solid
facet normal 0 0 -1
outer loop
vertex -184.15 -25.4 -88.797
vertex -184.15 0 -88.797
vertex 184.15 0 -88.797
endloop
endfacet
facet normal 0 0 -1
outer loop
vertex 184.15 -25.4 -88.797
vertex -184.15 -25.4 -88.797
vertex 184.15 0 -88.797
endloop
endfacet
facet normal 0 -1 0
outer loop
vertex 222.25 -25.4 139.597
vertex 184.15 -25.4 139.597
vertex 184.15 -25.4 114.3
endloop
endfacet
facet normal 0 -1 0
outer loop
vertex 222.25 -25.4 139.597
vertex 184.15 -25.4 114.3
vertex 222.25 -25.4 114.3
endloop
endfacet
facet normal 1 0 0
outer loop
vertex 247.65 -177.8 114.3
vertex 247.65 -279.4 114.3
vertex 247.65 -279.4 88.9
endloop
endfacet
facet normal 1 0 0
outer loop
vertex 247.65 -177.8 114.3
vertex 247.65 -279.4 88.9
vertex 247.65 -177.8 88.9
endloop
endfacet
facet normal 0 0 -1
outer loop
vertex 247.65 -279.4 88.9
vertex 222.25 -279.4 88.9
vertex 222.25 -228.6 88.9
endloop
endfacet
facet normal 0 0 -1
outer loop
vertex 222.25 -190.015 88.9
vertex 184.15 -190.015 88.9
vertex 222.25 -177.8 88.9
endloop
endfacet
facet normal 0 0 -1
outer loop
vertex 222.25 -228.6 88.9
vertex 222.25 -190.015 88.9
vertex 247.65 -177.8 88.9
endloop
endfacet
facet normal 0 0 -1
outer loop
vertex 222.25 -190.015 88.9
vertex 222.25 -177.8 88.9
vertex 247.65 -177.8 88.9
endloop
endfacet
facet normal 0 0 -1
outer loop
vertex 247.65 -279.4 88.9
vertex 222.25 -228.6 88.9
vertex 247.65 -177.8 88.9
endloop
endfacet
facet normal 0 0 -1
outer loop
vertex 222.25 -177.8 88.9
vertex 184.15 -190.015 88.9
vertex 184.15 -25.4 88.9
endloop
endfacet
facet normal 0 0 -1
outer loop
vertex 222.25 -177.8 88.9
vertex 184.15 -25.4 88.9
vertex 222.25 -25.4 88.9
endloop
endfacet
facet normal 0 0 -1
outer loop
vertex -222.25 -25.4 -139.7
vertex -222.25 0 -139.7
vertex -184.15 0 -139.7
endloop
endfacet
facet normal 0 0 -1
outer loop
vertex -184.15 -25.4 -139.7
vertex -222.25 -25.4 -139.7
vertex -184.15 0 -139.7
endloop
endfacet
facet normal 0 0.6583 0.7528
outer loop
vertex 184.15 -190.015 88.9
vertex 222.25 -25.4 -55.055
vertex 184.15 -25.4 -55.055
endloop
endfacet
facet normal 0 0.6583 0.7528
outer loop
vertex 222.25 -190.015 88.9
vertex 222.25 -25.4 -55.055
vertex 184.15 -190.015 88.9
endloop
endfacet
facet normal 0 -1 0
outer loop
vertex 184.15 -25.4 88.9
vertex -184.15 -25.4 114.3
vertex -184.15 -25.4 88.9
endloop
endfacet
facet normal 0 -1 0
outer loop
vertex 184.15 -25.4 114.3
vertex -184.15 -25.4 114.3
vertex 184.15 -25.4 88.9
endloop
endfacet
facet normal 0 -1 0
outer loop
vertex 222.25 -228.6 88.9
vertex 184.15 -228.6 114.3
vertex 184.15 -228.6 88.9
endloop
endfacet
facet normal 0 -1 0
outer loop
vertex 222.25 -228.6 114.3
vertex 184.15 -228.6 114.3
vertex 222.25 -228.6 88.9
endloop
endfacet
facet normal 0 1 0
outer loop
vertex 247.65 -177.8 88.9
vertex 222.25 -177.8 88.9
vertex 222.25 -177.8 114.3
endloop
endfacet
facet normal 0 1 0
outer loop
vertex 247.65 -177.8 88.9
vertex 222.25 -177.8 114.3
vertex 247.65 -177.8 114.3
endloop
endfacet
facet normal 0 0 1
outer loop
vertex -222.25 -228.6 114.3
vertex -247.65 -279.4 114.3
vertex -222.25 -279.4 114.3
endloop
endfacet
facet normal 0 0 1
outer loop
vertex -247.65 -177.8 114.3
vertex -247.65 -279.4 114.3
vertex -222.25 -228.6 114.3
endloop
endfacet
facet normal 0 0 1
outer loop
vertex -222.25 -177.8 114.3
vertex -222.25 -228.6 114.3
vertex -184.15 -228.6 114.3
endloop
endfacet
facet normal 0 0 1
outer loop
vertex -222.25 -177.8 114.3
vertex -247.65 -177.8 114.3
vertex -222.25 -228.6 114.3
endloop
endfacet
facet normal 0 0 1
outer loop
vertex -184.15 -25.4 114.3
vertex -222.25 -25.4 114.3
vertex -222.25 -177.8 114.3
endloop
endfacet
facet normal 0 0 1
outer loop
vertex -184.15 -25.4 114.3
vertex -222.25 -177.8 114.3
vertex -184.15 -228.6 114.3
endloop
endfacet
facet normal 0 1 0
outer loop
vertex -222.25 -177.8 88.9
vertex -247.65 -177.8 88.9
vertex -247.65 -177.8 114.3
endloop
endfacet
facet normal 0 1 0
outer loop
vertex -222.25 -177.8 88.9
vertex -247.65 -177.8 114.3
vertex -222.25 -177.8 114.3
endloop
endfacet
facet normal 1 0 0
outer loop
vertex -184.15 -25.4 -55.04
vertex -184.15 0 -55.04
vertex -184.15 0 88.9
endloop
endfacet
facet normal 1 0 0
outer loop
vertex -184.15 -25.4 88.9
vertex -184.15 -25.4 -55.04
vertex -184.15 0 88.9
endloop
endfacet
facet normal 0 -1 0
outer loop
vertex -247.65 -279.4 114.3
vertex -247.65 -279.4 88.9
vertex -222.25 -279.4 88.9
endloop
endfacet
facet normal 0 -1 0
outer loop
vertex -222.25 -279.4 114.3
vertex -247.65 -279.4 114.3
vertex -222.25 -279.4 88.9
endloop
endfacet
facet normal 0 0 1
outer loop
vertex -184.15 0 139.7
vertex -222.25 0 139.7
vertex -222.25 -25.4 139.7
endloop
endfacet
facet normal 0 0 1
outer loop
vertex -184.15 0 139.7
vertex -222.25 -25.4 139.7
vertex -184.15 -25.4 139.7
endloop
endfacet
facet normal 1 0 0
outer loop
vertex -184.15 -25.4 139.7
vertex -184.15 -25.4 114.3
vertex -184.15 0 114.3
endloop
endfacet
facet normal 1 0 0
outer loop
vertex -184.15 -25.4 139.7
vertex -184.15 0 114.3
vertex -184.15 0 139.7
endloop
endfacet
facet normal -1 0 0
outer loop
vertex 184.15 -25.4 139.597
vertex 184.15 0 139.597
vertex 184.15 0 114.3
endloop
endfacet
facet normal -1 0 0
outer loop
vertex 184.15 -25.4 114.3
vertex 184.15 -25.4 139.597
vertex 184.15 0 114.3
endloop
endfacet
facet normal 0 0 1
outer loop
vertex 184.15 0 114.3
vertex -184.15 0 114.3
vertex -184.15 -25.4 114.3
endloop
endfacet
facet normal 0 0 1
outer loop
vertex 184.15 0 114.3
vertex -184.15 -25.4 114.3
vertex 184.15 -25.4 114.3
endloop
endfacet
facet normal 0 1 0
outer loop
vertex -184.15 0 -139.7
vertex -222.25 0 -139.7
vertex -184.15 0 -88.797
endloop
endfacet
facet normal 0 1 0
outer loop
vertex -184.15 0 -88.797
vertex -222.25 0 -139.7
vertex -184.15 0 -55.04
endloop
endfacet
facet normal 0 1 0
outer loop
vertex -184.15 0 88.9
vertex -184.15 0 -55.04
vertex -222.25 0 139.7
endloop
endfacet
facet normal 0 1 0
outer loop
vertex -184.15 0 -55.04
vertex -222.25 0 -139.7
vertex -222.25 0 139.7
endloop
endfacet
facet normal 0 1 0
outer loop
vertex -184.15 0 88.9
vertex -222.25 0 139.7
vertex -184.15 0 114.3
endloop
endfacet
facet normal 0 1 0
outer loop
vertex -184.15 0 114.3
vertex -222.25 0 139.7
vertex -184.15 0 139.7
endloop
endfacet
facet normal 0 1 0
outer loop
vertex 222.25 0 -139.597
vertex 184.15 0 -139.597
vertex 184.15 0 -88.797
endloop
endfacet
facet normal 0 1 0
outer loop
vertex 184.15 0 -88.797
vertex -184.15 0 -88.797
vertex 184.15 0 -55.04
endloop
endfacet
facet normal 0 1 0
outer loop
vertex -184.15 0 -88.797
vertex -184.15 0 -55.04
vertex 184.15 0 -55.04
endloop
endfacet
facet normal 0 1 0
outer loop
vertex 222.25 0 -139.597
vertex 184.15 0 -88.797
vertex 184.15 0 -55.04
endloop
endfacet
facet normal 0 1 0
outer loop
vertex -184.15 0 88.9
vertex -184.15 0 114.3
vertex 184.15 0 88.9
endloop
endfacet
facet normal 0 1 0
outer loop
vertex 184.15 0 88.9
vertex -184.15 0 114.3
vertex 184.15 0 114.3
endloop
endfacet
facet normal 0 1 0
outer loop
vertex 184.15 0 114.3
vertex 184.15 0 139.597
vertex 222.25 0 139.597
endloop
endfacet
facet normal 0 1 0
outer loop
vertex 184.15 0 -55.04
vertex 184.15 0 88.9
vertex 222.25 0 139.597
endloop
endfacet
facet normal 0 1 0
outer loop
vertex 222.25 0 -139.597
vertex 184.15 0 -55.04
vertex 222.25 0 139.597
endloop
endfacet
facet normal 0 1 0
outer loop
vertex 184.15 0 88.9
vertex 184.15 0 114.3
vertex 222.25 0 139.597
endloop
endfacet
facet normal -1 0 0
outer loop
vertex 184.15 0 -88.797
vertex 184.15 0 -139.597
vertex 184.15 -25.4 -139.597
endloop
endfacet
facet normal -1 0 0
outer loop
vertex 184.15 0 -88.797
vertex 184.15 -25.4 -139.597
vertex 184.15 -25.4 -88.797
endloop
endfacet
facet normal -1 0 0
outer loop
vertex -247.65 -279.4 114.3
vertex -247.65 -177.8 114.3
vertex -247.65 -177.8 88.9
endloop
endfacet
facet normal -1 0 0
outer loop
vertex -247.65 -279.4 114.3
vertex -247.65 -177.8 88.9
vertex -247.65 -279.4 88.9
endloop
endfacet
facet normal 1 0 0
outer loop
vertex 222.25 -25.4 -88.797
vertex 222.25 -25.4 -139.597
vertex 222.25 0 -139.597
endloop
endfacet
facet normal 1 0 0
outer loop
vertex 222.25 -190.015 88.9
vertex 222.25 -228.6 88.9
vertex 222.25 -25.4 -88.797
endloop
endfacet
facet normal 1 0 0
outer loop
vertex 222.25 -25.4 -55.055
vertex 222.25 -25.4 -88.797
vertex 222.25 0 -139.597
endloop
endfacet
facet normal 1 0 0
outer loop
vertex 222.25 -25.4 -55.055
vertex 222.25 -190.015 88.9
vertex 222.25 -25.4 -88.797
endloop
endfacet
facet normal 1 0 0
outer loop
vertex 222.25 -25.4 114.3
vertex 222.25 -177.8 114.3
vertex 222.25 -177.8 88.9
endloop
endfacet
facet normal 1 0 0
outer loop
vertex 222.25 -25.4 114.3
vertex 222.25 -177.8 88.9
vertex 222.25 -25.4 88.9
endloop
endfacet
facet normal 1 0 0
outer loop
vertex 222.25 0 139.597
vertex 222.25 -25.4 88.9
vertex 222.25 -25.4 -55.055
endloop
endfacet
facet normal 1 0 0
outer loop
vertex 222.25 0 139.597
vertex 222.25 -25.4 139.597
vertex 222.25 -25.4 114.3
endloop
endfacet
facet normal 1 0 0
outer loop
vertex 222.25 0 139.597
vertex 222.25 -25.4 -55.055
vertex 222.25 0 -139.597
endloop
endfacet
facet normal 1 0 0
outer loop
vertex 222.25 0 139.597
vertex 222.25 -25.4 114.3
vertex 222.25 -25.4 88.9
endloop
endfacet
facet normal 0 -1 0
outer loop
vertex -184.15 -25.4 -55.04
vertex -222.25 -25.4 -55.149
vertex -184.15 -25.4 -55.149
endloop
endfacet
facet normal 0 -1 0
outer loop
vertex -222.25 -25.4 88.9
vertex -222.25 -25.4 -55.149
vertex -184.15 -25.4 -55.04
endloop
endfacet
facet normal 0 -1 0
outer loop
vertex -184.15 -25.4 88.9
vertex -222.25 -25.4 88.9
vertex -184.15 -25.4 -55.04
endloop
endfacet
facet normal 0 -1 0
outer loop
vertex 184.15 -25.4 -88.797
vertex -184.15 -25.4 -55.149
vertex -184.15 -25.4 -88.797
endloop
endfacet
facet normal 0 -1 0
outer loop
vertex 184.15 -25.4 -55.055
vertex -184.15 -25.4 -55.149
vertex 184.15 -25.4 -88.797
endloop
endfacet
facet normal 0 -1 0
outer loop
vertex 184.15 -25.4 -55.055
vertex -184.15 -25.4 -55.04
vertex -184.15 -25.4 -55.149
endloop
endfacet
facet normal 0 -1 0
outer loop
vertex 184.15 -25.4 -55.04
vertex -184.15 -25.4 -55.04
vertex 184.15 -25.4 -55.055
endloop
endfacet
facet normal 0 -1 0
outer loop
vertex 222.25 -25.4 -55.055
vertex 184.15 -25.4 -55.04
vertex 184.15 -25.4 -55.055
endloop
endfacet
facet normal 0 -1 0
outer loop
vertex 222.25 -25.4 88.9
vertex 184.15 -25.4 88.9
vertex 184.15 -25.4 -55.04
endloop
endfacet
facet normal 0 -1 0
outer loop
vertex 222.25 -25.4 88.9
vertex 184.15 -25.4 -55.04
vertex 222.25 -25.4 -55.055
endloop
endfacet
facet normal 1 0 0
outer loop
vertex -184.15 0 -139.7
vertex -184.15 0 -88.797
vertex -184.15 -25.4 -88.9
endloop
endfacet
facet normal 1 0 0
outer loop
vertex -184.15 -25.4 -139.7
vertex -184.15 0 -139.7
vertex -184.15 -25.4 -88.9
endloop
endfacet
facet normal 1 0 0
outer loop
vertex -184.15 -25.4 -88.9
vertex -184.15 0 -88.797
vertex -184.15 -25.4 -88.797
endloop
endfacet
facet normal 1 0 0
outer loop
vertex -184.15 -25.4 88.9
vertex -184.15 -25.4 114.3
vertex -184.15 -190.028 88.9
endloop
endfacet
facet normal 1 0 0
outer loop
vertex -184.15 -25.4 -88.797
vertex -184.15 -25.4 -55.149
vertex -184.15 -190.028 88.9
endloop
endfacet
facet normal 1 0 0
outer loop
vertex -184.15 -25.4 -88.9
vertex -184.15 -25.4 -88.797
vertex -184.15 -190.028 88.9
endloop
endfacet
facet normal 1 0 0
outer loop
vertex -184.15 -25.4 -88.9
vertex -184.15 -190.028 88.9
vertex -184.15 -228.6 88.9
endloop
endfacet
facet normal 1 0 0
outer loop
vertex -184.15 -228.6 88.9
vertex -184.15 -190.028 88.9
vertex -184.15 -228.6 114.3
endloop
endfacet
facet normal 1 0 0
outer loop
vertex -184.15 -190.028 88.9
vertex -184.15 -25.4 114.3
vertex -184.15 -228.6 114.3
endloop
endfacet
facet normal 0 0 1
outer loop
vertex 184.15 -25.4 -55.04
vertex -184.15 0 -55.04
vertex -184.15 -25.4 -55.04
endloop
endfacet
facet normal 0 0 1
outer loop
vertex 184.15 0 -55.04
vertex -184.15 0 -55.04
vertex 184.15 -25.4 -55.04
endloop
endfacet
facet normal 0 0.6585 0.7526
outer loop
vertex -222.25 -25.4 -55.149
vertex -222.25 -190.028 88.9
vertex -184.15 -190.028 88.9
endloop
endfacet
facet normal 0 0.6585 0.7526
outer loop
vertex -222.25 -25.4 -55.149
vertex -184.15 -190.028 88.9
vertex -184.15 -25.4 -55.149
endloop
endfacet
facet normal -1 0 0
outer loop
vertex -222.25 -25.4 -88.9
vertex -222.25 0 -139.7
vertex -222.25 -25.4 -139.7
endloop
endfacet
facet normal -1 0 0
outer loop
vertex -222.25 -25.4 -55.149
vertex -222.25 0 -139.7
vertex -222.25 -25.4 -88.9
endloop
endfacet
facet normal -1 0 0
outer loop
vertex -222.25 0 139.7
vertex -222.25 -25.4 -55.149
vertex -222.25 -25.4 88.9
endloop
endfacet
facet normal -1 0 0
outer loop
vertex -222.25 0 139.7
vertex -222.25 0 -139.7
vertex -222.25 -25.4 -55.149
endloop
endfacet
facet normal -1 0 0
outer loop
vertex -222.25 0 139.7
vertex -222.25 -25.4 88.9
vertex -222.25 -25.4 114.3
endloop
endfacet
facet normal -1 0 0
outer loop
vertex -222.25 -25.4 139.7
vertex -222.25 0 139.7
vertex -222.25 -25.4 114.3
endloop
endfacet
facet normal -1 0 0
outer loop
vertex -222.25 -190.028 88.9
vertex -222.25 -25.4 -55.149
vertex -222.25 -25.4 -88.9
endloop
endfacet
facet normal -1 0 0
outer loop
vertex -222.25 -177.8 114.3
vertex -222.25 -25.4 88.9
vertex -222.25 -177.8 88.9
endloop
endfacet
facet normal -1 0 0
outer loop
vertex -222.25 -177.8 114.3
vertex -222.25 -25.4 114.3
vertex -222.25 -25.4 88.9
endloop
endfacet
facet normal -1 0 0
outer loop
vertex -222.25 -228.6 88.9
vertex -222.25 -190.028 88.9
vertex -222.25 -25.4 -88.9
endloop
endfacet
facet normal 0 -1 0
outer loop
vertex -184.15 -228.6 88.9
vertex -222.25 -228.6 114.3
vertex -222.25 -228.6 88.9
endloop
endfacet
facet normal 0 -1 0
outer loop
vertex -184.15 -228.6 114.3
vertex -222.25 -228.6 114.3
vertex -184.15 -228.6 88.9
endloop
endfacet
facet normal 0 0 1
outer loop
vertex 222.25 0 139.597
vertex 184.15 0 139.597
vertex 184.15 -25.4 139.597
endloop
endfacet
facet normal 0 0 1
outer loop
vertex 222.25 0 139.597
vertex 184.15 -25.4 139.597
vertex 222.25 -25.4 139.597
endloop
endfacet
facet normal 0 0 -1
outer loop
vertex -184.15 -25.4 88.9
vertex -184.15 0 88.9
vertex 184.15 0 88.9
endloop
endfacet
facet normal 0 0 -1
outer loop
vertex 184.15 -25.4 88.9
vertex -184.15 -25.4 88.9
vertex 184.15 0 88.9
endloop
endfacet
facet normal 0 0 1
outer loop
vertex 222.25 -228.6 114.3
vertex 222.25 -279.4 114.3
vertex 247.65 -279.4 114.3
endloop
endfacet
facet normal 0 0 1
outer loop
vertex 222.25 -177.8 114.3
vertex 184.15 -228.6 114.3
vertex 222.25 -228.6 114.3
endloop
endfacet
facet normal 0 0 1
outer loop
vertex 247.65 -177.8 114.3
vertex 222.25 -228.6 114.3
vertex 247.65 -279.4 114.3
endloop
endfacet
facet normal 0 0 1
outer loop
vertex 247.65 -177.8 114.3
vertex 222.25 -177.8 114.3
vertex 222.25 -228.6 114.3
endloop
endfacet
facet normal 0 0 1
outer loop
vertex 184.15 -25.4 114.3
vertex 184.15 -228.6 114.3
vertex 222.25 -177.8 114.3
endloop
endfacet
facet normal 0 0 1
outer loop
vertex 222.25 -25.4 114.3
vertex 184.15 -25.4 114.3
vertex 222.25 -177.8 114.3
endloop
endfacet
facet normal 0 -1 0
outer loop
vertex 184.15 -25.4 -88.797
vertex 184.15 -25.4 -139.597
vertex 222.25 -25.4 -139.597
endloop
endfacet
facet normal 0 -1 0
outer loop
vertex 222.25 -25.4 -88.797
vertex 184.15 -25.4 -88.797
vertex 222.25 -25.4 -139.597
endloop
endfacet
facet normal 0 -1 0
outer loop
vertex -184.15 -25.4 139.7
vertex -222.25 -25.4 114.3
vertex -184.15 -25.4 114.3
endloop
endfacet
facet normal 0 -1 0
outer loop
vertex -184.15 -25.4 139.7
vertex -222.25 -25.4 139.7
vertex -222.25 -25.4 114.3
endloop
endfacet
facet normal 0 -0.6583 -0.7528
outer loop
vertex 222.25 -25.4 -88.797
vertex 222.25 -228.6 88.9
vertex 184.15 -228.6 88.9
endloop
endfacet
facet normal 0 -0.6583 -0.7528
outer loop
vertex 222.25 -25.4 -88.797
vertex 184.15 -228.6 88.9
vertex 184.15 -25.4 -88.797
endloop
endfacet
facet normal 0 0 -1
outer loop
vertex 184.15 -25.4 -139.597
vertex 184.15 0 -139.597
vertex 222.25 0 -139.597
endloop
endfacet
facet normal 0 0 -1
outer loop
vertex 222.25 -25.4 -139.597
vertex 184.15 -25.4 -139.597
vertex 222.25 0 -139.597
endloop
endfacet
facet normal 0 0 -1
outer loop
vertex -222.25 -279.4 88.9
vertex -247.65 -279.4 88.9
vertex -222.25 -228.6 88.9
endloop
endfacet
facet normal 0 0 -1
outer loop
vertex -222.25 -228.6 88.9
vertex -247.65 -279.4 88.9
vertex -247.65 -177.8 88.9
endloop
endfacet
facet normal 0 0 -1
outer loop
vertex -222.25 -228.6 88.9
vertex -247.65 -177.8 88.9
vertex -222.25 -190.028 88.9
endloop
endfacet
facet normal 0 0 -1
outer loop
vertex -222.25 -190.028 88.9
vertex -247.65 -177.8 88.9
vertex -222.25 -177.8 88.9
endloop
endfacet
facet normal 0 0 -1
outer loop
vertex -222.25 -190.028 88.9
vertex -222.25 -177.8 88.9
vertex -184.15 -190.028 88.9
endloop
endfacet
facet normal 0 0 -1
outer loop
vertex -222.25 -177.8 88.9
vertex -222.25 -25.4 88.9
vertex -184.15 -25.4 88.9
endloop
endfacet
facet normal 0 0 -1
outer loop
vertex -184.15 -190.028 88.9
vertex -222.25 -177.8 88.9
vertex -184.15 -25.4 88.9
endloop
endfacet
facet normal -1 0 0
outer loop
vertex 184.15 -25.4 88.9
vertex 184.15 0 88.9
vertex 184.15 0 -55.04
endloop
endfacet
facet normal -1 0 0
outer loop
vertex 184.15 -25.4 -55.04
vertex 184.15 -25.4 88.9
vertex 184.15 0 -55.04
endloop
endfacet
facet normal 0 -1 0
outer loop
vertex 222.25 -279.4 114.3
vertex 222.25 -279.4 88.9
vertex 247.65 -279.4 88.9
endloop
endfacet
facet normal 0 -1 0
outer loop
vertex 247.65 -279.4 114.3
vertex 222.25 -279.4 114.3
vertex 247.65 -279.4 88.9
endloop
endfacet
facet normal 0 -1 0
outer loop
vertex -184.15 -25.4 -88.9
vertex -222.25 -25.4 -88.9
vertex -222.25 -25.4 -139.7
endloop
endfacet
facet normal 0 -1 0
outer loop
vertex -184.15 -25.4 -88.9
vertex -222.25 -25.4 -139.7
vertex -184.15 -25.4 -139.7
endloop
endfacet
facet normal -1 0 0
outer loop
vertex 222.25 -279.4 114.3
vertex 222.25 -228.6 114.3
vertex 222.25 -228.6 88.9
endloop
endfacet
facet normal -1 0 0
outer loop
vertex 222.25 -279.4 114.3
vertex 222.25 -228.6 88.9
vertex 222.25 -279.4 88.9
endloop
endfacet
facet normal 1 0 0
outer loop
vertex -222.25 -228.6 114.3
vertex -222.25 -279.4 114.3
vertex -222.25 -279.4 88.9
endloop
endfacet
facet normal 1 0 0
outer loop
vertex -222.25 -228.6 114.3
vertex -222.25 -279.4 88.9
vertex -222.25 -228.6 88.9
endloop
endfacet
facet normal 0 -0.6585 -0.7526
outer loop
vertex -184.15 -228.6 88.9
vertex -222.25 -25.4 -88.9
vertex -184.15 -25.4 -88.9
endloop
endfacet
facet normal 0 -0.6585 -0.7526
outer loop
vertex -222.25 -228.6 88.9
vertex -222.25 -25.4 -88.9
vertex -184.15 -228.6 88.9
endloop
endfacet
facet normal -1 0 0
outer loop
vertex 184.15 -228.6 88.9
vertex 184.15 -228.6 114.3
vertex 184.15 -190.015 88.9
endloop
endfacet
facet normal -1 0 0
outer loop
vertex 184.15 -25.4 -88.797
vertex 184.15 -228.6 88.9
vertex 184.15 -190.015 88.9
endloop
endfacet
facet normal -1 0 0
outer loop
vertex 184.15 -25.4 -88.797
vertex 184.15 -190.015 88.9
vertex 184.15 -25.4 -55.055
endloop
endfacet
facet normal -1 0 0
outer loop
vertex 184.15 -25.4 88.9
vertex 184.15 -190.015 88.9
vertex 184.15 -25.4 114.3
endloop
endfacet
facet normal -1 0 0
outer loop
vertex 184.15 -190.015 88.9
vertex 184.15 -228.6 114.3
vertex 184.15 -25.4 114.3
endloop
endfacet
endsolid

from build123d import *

# Parameters (mm, degrees)
F0_W     = 38.1
F0_H     = 143.9402176437
F0_H_2   = 25.2968176437
F0_W_2   = 368.3
F0_H_3   = 33.7566
F0_H_4   = 50.9031823563
F0_H_5   = 25.4
F0_H_6   = 50.8
F1_DEPTH = 25.4
F2_W     = 38.1
F2_H     = 25.4
F3_DEPTH = 203.2
F5_DEPTH = 38.1
F7_DEPTH = 38.1
F8_W     = 25.4
F8_H     = 50.8
F9_DEPTH = 25.4


with BuildPart() as f1:
    # F0 (on Front) → F1 (new body)
    with BuildSketch(Plane.XZ):
        with Locations((203.2, 16.9298911782)):
            Rectangle(F0_W, F0_H)
        with Locations((203.2, 126.9484088218)):
            Rectangle(F0_W, F0_H_2)
        with Locations((0, -71.9185176437)):
            Rectangle(F0_W_2, F0_H_3)
        with Locations((203.2, -71.9185176437)):
            Rectangle(F0_W, F0_H_3)
        with Locations((-203.2, -114.2484088218)):
            Rectangle(F0_W, F0_H_4)
        with Locations((-203.2, 16.9298911782)):
            Rectangle(F0_W, F0_H)
        with Locations((-203.2, 101.6)):
            Rectangle(F0_W, F0_H_5)
        with Locations((203.2, 101.6)):
            Rectangle(F0_W, F0_H_5)
        with Locations((-203.2, 127)):
            Rectangle(F0_W, F0_H_5)
        with Locations((-203.2, -71.9185176437)):
            Rectangle(F0_W, F0_H_3)
        with Locations((0, 101.6)):
            Rectangle(F0_W_2, F0_H_5)
        with Locations((203.2, -114.1968176437)):
            Rectangle(F0_W, F0_H_6)
    extrude(amount=F1_DEPTH)

    # F2 (on face) → F3 (join)
    with BuildSketch(Plane.XZ.offset(25.4)):
        with Locations((-203.2, 101.6)):
            Rectangle(F2_W, F2_H)
        with Locations((203.2, 101.6)):
            Rectangle(F2_W, F2_H)
    extrude(amount=F3_DEPTH)

    # F4 (on face) → F5 (join)
    with BuildSketch(Plane(origin=(-222.25, 0, 0), x_dir=(0, -1, 0), z_dir=(-1, 0, 0))):
        Polygon((25.4, -88.9), (228.6, 88.9), (190.0277566224, 88.9), (25.4, -55.1492870446), align=None)
    extrude(amount=-F5_DEPTH)

    # F6 (on face) → F7 (join)
    with BuildSketch(Plane.YZ.offset(222.25)):
        Polygon((-25.4, -55.0545965492), (-190.0150696827, 88.9), (-228.6, 88.9), (-25.4, -88.7968176437), align=None)
    extrude(amount=-F7_DEPTH)

    # F8 (on face) → F9 (join)
    with BuildSketch(Plane.XY.offset(114.3)):
        with Locations((-234.95, -254)):
            Rectangle(F8_W, F8_H)
        with Locations((-234.95, -203.2)):
            Rectangle(F8_W, F8_H)
        with Locations((234.95, -203.2)):
            Rectangle(F8_W, F8_H)
        with Locations((234.95, -254)):
            Rectangle(F8_W, F8_H)
    extrude(amount=-F9_DEPTH)


solid = f1.part
